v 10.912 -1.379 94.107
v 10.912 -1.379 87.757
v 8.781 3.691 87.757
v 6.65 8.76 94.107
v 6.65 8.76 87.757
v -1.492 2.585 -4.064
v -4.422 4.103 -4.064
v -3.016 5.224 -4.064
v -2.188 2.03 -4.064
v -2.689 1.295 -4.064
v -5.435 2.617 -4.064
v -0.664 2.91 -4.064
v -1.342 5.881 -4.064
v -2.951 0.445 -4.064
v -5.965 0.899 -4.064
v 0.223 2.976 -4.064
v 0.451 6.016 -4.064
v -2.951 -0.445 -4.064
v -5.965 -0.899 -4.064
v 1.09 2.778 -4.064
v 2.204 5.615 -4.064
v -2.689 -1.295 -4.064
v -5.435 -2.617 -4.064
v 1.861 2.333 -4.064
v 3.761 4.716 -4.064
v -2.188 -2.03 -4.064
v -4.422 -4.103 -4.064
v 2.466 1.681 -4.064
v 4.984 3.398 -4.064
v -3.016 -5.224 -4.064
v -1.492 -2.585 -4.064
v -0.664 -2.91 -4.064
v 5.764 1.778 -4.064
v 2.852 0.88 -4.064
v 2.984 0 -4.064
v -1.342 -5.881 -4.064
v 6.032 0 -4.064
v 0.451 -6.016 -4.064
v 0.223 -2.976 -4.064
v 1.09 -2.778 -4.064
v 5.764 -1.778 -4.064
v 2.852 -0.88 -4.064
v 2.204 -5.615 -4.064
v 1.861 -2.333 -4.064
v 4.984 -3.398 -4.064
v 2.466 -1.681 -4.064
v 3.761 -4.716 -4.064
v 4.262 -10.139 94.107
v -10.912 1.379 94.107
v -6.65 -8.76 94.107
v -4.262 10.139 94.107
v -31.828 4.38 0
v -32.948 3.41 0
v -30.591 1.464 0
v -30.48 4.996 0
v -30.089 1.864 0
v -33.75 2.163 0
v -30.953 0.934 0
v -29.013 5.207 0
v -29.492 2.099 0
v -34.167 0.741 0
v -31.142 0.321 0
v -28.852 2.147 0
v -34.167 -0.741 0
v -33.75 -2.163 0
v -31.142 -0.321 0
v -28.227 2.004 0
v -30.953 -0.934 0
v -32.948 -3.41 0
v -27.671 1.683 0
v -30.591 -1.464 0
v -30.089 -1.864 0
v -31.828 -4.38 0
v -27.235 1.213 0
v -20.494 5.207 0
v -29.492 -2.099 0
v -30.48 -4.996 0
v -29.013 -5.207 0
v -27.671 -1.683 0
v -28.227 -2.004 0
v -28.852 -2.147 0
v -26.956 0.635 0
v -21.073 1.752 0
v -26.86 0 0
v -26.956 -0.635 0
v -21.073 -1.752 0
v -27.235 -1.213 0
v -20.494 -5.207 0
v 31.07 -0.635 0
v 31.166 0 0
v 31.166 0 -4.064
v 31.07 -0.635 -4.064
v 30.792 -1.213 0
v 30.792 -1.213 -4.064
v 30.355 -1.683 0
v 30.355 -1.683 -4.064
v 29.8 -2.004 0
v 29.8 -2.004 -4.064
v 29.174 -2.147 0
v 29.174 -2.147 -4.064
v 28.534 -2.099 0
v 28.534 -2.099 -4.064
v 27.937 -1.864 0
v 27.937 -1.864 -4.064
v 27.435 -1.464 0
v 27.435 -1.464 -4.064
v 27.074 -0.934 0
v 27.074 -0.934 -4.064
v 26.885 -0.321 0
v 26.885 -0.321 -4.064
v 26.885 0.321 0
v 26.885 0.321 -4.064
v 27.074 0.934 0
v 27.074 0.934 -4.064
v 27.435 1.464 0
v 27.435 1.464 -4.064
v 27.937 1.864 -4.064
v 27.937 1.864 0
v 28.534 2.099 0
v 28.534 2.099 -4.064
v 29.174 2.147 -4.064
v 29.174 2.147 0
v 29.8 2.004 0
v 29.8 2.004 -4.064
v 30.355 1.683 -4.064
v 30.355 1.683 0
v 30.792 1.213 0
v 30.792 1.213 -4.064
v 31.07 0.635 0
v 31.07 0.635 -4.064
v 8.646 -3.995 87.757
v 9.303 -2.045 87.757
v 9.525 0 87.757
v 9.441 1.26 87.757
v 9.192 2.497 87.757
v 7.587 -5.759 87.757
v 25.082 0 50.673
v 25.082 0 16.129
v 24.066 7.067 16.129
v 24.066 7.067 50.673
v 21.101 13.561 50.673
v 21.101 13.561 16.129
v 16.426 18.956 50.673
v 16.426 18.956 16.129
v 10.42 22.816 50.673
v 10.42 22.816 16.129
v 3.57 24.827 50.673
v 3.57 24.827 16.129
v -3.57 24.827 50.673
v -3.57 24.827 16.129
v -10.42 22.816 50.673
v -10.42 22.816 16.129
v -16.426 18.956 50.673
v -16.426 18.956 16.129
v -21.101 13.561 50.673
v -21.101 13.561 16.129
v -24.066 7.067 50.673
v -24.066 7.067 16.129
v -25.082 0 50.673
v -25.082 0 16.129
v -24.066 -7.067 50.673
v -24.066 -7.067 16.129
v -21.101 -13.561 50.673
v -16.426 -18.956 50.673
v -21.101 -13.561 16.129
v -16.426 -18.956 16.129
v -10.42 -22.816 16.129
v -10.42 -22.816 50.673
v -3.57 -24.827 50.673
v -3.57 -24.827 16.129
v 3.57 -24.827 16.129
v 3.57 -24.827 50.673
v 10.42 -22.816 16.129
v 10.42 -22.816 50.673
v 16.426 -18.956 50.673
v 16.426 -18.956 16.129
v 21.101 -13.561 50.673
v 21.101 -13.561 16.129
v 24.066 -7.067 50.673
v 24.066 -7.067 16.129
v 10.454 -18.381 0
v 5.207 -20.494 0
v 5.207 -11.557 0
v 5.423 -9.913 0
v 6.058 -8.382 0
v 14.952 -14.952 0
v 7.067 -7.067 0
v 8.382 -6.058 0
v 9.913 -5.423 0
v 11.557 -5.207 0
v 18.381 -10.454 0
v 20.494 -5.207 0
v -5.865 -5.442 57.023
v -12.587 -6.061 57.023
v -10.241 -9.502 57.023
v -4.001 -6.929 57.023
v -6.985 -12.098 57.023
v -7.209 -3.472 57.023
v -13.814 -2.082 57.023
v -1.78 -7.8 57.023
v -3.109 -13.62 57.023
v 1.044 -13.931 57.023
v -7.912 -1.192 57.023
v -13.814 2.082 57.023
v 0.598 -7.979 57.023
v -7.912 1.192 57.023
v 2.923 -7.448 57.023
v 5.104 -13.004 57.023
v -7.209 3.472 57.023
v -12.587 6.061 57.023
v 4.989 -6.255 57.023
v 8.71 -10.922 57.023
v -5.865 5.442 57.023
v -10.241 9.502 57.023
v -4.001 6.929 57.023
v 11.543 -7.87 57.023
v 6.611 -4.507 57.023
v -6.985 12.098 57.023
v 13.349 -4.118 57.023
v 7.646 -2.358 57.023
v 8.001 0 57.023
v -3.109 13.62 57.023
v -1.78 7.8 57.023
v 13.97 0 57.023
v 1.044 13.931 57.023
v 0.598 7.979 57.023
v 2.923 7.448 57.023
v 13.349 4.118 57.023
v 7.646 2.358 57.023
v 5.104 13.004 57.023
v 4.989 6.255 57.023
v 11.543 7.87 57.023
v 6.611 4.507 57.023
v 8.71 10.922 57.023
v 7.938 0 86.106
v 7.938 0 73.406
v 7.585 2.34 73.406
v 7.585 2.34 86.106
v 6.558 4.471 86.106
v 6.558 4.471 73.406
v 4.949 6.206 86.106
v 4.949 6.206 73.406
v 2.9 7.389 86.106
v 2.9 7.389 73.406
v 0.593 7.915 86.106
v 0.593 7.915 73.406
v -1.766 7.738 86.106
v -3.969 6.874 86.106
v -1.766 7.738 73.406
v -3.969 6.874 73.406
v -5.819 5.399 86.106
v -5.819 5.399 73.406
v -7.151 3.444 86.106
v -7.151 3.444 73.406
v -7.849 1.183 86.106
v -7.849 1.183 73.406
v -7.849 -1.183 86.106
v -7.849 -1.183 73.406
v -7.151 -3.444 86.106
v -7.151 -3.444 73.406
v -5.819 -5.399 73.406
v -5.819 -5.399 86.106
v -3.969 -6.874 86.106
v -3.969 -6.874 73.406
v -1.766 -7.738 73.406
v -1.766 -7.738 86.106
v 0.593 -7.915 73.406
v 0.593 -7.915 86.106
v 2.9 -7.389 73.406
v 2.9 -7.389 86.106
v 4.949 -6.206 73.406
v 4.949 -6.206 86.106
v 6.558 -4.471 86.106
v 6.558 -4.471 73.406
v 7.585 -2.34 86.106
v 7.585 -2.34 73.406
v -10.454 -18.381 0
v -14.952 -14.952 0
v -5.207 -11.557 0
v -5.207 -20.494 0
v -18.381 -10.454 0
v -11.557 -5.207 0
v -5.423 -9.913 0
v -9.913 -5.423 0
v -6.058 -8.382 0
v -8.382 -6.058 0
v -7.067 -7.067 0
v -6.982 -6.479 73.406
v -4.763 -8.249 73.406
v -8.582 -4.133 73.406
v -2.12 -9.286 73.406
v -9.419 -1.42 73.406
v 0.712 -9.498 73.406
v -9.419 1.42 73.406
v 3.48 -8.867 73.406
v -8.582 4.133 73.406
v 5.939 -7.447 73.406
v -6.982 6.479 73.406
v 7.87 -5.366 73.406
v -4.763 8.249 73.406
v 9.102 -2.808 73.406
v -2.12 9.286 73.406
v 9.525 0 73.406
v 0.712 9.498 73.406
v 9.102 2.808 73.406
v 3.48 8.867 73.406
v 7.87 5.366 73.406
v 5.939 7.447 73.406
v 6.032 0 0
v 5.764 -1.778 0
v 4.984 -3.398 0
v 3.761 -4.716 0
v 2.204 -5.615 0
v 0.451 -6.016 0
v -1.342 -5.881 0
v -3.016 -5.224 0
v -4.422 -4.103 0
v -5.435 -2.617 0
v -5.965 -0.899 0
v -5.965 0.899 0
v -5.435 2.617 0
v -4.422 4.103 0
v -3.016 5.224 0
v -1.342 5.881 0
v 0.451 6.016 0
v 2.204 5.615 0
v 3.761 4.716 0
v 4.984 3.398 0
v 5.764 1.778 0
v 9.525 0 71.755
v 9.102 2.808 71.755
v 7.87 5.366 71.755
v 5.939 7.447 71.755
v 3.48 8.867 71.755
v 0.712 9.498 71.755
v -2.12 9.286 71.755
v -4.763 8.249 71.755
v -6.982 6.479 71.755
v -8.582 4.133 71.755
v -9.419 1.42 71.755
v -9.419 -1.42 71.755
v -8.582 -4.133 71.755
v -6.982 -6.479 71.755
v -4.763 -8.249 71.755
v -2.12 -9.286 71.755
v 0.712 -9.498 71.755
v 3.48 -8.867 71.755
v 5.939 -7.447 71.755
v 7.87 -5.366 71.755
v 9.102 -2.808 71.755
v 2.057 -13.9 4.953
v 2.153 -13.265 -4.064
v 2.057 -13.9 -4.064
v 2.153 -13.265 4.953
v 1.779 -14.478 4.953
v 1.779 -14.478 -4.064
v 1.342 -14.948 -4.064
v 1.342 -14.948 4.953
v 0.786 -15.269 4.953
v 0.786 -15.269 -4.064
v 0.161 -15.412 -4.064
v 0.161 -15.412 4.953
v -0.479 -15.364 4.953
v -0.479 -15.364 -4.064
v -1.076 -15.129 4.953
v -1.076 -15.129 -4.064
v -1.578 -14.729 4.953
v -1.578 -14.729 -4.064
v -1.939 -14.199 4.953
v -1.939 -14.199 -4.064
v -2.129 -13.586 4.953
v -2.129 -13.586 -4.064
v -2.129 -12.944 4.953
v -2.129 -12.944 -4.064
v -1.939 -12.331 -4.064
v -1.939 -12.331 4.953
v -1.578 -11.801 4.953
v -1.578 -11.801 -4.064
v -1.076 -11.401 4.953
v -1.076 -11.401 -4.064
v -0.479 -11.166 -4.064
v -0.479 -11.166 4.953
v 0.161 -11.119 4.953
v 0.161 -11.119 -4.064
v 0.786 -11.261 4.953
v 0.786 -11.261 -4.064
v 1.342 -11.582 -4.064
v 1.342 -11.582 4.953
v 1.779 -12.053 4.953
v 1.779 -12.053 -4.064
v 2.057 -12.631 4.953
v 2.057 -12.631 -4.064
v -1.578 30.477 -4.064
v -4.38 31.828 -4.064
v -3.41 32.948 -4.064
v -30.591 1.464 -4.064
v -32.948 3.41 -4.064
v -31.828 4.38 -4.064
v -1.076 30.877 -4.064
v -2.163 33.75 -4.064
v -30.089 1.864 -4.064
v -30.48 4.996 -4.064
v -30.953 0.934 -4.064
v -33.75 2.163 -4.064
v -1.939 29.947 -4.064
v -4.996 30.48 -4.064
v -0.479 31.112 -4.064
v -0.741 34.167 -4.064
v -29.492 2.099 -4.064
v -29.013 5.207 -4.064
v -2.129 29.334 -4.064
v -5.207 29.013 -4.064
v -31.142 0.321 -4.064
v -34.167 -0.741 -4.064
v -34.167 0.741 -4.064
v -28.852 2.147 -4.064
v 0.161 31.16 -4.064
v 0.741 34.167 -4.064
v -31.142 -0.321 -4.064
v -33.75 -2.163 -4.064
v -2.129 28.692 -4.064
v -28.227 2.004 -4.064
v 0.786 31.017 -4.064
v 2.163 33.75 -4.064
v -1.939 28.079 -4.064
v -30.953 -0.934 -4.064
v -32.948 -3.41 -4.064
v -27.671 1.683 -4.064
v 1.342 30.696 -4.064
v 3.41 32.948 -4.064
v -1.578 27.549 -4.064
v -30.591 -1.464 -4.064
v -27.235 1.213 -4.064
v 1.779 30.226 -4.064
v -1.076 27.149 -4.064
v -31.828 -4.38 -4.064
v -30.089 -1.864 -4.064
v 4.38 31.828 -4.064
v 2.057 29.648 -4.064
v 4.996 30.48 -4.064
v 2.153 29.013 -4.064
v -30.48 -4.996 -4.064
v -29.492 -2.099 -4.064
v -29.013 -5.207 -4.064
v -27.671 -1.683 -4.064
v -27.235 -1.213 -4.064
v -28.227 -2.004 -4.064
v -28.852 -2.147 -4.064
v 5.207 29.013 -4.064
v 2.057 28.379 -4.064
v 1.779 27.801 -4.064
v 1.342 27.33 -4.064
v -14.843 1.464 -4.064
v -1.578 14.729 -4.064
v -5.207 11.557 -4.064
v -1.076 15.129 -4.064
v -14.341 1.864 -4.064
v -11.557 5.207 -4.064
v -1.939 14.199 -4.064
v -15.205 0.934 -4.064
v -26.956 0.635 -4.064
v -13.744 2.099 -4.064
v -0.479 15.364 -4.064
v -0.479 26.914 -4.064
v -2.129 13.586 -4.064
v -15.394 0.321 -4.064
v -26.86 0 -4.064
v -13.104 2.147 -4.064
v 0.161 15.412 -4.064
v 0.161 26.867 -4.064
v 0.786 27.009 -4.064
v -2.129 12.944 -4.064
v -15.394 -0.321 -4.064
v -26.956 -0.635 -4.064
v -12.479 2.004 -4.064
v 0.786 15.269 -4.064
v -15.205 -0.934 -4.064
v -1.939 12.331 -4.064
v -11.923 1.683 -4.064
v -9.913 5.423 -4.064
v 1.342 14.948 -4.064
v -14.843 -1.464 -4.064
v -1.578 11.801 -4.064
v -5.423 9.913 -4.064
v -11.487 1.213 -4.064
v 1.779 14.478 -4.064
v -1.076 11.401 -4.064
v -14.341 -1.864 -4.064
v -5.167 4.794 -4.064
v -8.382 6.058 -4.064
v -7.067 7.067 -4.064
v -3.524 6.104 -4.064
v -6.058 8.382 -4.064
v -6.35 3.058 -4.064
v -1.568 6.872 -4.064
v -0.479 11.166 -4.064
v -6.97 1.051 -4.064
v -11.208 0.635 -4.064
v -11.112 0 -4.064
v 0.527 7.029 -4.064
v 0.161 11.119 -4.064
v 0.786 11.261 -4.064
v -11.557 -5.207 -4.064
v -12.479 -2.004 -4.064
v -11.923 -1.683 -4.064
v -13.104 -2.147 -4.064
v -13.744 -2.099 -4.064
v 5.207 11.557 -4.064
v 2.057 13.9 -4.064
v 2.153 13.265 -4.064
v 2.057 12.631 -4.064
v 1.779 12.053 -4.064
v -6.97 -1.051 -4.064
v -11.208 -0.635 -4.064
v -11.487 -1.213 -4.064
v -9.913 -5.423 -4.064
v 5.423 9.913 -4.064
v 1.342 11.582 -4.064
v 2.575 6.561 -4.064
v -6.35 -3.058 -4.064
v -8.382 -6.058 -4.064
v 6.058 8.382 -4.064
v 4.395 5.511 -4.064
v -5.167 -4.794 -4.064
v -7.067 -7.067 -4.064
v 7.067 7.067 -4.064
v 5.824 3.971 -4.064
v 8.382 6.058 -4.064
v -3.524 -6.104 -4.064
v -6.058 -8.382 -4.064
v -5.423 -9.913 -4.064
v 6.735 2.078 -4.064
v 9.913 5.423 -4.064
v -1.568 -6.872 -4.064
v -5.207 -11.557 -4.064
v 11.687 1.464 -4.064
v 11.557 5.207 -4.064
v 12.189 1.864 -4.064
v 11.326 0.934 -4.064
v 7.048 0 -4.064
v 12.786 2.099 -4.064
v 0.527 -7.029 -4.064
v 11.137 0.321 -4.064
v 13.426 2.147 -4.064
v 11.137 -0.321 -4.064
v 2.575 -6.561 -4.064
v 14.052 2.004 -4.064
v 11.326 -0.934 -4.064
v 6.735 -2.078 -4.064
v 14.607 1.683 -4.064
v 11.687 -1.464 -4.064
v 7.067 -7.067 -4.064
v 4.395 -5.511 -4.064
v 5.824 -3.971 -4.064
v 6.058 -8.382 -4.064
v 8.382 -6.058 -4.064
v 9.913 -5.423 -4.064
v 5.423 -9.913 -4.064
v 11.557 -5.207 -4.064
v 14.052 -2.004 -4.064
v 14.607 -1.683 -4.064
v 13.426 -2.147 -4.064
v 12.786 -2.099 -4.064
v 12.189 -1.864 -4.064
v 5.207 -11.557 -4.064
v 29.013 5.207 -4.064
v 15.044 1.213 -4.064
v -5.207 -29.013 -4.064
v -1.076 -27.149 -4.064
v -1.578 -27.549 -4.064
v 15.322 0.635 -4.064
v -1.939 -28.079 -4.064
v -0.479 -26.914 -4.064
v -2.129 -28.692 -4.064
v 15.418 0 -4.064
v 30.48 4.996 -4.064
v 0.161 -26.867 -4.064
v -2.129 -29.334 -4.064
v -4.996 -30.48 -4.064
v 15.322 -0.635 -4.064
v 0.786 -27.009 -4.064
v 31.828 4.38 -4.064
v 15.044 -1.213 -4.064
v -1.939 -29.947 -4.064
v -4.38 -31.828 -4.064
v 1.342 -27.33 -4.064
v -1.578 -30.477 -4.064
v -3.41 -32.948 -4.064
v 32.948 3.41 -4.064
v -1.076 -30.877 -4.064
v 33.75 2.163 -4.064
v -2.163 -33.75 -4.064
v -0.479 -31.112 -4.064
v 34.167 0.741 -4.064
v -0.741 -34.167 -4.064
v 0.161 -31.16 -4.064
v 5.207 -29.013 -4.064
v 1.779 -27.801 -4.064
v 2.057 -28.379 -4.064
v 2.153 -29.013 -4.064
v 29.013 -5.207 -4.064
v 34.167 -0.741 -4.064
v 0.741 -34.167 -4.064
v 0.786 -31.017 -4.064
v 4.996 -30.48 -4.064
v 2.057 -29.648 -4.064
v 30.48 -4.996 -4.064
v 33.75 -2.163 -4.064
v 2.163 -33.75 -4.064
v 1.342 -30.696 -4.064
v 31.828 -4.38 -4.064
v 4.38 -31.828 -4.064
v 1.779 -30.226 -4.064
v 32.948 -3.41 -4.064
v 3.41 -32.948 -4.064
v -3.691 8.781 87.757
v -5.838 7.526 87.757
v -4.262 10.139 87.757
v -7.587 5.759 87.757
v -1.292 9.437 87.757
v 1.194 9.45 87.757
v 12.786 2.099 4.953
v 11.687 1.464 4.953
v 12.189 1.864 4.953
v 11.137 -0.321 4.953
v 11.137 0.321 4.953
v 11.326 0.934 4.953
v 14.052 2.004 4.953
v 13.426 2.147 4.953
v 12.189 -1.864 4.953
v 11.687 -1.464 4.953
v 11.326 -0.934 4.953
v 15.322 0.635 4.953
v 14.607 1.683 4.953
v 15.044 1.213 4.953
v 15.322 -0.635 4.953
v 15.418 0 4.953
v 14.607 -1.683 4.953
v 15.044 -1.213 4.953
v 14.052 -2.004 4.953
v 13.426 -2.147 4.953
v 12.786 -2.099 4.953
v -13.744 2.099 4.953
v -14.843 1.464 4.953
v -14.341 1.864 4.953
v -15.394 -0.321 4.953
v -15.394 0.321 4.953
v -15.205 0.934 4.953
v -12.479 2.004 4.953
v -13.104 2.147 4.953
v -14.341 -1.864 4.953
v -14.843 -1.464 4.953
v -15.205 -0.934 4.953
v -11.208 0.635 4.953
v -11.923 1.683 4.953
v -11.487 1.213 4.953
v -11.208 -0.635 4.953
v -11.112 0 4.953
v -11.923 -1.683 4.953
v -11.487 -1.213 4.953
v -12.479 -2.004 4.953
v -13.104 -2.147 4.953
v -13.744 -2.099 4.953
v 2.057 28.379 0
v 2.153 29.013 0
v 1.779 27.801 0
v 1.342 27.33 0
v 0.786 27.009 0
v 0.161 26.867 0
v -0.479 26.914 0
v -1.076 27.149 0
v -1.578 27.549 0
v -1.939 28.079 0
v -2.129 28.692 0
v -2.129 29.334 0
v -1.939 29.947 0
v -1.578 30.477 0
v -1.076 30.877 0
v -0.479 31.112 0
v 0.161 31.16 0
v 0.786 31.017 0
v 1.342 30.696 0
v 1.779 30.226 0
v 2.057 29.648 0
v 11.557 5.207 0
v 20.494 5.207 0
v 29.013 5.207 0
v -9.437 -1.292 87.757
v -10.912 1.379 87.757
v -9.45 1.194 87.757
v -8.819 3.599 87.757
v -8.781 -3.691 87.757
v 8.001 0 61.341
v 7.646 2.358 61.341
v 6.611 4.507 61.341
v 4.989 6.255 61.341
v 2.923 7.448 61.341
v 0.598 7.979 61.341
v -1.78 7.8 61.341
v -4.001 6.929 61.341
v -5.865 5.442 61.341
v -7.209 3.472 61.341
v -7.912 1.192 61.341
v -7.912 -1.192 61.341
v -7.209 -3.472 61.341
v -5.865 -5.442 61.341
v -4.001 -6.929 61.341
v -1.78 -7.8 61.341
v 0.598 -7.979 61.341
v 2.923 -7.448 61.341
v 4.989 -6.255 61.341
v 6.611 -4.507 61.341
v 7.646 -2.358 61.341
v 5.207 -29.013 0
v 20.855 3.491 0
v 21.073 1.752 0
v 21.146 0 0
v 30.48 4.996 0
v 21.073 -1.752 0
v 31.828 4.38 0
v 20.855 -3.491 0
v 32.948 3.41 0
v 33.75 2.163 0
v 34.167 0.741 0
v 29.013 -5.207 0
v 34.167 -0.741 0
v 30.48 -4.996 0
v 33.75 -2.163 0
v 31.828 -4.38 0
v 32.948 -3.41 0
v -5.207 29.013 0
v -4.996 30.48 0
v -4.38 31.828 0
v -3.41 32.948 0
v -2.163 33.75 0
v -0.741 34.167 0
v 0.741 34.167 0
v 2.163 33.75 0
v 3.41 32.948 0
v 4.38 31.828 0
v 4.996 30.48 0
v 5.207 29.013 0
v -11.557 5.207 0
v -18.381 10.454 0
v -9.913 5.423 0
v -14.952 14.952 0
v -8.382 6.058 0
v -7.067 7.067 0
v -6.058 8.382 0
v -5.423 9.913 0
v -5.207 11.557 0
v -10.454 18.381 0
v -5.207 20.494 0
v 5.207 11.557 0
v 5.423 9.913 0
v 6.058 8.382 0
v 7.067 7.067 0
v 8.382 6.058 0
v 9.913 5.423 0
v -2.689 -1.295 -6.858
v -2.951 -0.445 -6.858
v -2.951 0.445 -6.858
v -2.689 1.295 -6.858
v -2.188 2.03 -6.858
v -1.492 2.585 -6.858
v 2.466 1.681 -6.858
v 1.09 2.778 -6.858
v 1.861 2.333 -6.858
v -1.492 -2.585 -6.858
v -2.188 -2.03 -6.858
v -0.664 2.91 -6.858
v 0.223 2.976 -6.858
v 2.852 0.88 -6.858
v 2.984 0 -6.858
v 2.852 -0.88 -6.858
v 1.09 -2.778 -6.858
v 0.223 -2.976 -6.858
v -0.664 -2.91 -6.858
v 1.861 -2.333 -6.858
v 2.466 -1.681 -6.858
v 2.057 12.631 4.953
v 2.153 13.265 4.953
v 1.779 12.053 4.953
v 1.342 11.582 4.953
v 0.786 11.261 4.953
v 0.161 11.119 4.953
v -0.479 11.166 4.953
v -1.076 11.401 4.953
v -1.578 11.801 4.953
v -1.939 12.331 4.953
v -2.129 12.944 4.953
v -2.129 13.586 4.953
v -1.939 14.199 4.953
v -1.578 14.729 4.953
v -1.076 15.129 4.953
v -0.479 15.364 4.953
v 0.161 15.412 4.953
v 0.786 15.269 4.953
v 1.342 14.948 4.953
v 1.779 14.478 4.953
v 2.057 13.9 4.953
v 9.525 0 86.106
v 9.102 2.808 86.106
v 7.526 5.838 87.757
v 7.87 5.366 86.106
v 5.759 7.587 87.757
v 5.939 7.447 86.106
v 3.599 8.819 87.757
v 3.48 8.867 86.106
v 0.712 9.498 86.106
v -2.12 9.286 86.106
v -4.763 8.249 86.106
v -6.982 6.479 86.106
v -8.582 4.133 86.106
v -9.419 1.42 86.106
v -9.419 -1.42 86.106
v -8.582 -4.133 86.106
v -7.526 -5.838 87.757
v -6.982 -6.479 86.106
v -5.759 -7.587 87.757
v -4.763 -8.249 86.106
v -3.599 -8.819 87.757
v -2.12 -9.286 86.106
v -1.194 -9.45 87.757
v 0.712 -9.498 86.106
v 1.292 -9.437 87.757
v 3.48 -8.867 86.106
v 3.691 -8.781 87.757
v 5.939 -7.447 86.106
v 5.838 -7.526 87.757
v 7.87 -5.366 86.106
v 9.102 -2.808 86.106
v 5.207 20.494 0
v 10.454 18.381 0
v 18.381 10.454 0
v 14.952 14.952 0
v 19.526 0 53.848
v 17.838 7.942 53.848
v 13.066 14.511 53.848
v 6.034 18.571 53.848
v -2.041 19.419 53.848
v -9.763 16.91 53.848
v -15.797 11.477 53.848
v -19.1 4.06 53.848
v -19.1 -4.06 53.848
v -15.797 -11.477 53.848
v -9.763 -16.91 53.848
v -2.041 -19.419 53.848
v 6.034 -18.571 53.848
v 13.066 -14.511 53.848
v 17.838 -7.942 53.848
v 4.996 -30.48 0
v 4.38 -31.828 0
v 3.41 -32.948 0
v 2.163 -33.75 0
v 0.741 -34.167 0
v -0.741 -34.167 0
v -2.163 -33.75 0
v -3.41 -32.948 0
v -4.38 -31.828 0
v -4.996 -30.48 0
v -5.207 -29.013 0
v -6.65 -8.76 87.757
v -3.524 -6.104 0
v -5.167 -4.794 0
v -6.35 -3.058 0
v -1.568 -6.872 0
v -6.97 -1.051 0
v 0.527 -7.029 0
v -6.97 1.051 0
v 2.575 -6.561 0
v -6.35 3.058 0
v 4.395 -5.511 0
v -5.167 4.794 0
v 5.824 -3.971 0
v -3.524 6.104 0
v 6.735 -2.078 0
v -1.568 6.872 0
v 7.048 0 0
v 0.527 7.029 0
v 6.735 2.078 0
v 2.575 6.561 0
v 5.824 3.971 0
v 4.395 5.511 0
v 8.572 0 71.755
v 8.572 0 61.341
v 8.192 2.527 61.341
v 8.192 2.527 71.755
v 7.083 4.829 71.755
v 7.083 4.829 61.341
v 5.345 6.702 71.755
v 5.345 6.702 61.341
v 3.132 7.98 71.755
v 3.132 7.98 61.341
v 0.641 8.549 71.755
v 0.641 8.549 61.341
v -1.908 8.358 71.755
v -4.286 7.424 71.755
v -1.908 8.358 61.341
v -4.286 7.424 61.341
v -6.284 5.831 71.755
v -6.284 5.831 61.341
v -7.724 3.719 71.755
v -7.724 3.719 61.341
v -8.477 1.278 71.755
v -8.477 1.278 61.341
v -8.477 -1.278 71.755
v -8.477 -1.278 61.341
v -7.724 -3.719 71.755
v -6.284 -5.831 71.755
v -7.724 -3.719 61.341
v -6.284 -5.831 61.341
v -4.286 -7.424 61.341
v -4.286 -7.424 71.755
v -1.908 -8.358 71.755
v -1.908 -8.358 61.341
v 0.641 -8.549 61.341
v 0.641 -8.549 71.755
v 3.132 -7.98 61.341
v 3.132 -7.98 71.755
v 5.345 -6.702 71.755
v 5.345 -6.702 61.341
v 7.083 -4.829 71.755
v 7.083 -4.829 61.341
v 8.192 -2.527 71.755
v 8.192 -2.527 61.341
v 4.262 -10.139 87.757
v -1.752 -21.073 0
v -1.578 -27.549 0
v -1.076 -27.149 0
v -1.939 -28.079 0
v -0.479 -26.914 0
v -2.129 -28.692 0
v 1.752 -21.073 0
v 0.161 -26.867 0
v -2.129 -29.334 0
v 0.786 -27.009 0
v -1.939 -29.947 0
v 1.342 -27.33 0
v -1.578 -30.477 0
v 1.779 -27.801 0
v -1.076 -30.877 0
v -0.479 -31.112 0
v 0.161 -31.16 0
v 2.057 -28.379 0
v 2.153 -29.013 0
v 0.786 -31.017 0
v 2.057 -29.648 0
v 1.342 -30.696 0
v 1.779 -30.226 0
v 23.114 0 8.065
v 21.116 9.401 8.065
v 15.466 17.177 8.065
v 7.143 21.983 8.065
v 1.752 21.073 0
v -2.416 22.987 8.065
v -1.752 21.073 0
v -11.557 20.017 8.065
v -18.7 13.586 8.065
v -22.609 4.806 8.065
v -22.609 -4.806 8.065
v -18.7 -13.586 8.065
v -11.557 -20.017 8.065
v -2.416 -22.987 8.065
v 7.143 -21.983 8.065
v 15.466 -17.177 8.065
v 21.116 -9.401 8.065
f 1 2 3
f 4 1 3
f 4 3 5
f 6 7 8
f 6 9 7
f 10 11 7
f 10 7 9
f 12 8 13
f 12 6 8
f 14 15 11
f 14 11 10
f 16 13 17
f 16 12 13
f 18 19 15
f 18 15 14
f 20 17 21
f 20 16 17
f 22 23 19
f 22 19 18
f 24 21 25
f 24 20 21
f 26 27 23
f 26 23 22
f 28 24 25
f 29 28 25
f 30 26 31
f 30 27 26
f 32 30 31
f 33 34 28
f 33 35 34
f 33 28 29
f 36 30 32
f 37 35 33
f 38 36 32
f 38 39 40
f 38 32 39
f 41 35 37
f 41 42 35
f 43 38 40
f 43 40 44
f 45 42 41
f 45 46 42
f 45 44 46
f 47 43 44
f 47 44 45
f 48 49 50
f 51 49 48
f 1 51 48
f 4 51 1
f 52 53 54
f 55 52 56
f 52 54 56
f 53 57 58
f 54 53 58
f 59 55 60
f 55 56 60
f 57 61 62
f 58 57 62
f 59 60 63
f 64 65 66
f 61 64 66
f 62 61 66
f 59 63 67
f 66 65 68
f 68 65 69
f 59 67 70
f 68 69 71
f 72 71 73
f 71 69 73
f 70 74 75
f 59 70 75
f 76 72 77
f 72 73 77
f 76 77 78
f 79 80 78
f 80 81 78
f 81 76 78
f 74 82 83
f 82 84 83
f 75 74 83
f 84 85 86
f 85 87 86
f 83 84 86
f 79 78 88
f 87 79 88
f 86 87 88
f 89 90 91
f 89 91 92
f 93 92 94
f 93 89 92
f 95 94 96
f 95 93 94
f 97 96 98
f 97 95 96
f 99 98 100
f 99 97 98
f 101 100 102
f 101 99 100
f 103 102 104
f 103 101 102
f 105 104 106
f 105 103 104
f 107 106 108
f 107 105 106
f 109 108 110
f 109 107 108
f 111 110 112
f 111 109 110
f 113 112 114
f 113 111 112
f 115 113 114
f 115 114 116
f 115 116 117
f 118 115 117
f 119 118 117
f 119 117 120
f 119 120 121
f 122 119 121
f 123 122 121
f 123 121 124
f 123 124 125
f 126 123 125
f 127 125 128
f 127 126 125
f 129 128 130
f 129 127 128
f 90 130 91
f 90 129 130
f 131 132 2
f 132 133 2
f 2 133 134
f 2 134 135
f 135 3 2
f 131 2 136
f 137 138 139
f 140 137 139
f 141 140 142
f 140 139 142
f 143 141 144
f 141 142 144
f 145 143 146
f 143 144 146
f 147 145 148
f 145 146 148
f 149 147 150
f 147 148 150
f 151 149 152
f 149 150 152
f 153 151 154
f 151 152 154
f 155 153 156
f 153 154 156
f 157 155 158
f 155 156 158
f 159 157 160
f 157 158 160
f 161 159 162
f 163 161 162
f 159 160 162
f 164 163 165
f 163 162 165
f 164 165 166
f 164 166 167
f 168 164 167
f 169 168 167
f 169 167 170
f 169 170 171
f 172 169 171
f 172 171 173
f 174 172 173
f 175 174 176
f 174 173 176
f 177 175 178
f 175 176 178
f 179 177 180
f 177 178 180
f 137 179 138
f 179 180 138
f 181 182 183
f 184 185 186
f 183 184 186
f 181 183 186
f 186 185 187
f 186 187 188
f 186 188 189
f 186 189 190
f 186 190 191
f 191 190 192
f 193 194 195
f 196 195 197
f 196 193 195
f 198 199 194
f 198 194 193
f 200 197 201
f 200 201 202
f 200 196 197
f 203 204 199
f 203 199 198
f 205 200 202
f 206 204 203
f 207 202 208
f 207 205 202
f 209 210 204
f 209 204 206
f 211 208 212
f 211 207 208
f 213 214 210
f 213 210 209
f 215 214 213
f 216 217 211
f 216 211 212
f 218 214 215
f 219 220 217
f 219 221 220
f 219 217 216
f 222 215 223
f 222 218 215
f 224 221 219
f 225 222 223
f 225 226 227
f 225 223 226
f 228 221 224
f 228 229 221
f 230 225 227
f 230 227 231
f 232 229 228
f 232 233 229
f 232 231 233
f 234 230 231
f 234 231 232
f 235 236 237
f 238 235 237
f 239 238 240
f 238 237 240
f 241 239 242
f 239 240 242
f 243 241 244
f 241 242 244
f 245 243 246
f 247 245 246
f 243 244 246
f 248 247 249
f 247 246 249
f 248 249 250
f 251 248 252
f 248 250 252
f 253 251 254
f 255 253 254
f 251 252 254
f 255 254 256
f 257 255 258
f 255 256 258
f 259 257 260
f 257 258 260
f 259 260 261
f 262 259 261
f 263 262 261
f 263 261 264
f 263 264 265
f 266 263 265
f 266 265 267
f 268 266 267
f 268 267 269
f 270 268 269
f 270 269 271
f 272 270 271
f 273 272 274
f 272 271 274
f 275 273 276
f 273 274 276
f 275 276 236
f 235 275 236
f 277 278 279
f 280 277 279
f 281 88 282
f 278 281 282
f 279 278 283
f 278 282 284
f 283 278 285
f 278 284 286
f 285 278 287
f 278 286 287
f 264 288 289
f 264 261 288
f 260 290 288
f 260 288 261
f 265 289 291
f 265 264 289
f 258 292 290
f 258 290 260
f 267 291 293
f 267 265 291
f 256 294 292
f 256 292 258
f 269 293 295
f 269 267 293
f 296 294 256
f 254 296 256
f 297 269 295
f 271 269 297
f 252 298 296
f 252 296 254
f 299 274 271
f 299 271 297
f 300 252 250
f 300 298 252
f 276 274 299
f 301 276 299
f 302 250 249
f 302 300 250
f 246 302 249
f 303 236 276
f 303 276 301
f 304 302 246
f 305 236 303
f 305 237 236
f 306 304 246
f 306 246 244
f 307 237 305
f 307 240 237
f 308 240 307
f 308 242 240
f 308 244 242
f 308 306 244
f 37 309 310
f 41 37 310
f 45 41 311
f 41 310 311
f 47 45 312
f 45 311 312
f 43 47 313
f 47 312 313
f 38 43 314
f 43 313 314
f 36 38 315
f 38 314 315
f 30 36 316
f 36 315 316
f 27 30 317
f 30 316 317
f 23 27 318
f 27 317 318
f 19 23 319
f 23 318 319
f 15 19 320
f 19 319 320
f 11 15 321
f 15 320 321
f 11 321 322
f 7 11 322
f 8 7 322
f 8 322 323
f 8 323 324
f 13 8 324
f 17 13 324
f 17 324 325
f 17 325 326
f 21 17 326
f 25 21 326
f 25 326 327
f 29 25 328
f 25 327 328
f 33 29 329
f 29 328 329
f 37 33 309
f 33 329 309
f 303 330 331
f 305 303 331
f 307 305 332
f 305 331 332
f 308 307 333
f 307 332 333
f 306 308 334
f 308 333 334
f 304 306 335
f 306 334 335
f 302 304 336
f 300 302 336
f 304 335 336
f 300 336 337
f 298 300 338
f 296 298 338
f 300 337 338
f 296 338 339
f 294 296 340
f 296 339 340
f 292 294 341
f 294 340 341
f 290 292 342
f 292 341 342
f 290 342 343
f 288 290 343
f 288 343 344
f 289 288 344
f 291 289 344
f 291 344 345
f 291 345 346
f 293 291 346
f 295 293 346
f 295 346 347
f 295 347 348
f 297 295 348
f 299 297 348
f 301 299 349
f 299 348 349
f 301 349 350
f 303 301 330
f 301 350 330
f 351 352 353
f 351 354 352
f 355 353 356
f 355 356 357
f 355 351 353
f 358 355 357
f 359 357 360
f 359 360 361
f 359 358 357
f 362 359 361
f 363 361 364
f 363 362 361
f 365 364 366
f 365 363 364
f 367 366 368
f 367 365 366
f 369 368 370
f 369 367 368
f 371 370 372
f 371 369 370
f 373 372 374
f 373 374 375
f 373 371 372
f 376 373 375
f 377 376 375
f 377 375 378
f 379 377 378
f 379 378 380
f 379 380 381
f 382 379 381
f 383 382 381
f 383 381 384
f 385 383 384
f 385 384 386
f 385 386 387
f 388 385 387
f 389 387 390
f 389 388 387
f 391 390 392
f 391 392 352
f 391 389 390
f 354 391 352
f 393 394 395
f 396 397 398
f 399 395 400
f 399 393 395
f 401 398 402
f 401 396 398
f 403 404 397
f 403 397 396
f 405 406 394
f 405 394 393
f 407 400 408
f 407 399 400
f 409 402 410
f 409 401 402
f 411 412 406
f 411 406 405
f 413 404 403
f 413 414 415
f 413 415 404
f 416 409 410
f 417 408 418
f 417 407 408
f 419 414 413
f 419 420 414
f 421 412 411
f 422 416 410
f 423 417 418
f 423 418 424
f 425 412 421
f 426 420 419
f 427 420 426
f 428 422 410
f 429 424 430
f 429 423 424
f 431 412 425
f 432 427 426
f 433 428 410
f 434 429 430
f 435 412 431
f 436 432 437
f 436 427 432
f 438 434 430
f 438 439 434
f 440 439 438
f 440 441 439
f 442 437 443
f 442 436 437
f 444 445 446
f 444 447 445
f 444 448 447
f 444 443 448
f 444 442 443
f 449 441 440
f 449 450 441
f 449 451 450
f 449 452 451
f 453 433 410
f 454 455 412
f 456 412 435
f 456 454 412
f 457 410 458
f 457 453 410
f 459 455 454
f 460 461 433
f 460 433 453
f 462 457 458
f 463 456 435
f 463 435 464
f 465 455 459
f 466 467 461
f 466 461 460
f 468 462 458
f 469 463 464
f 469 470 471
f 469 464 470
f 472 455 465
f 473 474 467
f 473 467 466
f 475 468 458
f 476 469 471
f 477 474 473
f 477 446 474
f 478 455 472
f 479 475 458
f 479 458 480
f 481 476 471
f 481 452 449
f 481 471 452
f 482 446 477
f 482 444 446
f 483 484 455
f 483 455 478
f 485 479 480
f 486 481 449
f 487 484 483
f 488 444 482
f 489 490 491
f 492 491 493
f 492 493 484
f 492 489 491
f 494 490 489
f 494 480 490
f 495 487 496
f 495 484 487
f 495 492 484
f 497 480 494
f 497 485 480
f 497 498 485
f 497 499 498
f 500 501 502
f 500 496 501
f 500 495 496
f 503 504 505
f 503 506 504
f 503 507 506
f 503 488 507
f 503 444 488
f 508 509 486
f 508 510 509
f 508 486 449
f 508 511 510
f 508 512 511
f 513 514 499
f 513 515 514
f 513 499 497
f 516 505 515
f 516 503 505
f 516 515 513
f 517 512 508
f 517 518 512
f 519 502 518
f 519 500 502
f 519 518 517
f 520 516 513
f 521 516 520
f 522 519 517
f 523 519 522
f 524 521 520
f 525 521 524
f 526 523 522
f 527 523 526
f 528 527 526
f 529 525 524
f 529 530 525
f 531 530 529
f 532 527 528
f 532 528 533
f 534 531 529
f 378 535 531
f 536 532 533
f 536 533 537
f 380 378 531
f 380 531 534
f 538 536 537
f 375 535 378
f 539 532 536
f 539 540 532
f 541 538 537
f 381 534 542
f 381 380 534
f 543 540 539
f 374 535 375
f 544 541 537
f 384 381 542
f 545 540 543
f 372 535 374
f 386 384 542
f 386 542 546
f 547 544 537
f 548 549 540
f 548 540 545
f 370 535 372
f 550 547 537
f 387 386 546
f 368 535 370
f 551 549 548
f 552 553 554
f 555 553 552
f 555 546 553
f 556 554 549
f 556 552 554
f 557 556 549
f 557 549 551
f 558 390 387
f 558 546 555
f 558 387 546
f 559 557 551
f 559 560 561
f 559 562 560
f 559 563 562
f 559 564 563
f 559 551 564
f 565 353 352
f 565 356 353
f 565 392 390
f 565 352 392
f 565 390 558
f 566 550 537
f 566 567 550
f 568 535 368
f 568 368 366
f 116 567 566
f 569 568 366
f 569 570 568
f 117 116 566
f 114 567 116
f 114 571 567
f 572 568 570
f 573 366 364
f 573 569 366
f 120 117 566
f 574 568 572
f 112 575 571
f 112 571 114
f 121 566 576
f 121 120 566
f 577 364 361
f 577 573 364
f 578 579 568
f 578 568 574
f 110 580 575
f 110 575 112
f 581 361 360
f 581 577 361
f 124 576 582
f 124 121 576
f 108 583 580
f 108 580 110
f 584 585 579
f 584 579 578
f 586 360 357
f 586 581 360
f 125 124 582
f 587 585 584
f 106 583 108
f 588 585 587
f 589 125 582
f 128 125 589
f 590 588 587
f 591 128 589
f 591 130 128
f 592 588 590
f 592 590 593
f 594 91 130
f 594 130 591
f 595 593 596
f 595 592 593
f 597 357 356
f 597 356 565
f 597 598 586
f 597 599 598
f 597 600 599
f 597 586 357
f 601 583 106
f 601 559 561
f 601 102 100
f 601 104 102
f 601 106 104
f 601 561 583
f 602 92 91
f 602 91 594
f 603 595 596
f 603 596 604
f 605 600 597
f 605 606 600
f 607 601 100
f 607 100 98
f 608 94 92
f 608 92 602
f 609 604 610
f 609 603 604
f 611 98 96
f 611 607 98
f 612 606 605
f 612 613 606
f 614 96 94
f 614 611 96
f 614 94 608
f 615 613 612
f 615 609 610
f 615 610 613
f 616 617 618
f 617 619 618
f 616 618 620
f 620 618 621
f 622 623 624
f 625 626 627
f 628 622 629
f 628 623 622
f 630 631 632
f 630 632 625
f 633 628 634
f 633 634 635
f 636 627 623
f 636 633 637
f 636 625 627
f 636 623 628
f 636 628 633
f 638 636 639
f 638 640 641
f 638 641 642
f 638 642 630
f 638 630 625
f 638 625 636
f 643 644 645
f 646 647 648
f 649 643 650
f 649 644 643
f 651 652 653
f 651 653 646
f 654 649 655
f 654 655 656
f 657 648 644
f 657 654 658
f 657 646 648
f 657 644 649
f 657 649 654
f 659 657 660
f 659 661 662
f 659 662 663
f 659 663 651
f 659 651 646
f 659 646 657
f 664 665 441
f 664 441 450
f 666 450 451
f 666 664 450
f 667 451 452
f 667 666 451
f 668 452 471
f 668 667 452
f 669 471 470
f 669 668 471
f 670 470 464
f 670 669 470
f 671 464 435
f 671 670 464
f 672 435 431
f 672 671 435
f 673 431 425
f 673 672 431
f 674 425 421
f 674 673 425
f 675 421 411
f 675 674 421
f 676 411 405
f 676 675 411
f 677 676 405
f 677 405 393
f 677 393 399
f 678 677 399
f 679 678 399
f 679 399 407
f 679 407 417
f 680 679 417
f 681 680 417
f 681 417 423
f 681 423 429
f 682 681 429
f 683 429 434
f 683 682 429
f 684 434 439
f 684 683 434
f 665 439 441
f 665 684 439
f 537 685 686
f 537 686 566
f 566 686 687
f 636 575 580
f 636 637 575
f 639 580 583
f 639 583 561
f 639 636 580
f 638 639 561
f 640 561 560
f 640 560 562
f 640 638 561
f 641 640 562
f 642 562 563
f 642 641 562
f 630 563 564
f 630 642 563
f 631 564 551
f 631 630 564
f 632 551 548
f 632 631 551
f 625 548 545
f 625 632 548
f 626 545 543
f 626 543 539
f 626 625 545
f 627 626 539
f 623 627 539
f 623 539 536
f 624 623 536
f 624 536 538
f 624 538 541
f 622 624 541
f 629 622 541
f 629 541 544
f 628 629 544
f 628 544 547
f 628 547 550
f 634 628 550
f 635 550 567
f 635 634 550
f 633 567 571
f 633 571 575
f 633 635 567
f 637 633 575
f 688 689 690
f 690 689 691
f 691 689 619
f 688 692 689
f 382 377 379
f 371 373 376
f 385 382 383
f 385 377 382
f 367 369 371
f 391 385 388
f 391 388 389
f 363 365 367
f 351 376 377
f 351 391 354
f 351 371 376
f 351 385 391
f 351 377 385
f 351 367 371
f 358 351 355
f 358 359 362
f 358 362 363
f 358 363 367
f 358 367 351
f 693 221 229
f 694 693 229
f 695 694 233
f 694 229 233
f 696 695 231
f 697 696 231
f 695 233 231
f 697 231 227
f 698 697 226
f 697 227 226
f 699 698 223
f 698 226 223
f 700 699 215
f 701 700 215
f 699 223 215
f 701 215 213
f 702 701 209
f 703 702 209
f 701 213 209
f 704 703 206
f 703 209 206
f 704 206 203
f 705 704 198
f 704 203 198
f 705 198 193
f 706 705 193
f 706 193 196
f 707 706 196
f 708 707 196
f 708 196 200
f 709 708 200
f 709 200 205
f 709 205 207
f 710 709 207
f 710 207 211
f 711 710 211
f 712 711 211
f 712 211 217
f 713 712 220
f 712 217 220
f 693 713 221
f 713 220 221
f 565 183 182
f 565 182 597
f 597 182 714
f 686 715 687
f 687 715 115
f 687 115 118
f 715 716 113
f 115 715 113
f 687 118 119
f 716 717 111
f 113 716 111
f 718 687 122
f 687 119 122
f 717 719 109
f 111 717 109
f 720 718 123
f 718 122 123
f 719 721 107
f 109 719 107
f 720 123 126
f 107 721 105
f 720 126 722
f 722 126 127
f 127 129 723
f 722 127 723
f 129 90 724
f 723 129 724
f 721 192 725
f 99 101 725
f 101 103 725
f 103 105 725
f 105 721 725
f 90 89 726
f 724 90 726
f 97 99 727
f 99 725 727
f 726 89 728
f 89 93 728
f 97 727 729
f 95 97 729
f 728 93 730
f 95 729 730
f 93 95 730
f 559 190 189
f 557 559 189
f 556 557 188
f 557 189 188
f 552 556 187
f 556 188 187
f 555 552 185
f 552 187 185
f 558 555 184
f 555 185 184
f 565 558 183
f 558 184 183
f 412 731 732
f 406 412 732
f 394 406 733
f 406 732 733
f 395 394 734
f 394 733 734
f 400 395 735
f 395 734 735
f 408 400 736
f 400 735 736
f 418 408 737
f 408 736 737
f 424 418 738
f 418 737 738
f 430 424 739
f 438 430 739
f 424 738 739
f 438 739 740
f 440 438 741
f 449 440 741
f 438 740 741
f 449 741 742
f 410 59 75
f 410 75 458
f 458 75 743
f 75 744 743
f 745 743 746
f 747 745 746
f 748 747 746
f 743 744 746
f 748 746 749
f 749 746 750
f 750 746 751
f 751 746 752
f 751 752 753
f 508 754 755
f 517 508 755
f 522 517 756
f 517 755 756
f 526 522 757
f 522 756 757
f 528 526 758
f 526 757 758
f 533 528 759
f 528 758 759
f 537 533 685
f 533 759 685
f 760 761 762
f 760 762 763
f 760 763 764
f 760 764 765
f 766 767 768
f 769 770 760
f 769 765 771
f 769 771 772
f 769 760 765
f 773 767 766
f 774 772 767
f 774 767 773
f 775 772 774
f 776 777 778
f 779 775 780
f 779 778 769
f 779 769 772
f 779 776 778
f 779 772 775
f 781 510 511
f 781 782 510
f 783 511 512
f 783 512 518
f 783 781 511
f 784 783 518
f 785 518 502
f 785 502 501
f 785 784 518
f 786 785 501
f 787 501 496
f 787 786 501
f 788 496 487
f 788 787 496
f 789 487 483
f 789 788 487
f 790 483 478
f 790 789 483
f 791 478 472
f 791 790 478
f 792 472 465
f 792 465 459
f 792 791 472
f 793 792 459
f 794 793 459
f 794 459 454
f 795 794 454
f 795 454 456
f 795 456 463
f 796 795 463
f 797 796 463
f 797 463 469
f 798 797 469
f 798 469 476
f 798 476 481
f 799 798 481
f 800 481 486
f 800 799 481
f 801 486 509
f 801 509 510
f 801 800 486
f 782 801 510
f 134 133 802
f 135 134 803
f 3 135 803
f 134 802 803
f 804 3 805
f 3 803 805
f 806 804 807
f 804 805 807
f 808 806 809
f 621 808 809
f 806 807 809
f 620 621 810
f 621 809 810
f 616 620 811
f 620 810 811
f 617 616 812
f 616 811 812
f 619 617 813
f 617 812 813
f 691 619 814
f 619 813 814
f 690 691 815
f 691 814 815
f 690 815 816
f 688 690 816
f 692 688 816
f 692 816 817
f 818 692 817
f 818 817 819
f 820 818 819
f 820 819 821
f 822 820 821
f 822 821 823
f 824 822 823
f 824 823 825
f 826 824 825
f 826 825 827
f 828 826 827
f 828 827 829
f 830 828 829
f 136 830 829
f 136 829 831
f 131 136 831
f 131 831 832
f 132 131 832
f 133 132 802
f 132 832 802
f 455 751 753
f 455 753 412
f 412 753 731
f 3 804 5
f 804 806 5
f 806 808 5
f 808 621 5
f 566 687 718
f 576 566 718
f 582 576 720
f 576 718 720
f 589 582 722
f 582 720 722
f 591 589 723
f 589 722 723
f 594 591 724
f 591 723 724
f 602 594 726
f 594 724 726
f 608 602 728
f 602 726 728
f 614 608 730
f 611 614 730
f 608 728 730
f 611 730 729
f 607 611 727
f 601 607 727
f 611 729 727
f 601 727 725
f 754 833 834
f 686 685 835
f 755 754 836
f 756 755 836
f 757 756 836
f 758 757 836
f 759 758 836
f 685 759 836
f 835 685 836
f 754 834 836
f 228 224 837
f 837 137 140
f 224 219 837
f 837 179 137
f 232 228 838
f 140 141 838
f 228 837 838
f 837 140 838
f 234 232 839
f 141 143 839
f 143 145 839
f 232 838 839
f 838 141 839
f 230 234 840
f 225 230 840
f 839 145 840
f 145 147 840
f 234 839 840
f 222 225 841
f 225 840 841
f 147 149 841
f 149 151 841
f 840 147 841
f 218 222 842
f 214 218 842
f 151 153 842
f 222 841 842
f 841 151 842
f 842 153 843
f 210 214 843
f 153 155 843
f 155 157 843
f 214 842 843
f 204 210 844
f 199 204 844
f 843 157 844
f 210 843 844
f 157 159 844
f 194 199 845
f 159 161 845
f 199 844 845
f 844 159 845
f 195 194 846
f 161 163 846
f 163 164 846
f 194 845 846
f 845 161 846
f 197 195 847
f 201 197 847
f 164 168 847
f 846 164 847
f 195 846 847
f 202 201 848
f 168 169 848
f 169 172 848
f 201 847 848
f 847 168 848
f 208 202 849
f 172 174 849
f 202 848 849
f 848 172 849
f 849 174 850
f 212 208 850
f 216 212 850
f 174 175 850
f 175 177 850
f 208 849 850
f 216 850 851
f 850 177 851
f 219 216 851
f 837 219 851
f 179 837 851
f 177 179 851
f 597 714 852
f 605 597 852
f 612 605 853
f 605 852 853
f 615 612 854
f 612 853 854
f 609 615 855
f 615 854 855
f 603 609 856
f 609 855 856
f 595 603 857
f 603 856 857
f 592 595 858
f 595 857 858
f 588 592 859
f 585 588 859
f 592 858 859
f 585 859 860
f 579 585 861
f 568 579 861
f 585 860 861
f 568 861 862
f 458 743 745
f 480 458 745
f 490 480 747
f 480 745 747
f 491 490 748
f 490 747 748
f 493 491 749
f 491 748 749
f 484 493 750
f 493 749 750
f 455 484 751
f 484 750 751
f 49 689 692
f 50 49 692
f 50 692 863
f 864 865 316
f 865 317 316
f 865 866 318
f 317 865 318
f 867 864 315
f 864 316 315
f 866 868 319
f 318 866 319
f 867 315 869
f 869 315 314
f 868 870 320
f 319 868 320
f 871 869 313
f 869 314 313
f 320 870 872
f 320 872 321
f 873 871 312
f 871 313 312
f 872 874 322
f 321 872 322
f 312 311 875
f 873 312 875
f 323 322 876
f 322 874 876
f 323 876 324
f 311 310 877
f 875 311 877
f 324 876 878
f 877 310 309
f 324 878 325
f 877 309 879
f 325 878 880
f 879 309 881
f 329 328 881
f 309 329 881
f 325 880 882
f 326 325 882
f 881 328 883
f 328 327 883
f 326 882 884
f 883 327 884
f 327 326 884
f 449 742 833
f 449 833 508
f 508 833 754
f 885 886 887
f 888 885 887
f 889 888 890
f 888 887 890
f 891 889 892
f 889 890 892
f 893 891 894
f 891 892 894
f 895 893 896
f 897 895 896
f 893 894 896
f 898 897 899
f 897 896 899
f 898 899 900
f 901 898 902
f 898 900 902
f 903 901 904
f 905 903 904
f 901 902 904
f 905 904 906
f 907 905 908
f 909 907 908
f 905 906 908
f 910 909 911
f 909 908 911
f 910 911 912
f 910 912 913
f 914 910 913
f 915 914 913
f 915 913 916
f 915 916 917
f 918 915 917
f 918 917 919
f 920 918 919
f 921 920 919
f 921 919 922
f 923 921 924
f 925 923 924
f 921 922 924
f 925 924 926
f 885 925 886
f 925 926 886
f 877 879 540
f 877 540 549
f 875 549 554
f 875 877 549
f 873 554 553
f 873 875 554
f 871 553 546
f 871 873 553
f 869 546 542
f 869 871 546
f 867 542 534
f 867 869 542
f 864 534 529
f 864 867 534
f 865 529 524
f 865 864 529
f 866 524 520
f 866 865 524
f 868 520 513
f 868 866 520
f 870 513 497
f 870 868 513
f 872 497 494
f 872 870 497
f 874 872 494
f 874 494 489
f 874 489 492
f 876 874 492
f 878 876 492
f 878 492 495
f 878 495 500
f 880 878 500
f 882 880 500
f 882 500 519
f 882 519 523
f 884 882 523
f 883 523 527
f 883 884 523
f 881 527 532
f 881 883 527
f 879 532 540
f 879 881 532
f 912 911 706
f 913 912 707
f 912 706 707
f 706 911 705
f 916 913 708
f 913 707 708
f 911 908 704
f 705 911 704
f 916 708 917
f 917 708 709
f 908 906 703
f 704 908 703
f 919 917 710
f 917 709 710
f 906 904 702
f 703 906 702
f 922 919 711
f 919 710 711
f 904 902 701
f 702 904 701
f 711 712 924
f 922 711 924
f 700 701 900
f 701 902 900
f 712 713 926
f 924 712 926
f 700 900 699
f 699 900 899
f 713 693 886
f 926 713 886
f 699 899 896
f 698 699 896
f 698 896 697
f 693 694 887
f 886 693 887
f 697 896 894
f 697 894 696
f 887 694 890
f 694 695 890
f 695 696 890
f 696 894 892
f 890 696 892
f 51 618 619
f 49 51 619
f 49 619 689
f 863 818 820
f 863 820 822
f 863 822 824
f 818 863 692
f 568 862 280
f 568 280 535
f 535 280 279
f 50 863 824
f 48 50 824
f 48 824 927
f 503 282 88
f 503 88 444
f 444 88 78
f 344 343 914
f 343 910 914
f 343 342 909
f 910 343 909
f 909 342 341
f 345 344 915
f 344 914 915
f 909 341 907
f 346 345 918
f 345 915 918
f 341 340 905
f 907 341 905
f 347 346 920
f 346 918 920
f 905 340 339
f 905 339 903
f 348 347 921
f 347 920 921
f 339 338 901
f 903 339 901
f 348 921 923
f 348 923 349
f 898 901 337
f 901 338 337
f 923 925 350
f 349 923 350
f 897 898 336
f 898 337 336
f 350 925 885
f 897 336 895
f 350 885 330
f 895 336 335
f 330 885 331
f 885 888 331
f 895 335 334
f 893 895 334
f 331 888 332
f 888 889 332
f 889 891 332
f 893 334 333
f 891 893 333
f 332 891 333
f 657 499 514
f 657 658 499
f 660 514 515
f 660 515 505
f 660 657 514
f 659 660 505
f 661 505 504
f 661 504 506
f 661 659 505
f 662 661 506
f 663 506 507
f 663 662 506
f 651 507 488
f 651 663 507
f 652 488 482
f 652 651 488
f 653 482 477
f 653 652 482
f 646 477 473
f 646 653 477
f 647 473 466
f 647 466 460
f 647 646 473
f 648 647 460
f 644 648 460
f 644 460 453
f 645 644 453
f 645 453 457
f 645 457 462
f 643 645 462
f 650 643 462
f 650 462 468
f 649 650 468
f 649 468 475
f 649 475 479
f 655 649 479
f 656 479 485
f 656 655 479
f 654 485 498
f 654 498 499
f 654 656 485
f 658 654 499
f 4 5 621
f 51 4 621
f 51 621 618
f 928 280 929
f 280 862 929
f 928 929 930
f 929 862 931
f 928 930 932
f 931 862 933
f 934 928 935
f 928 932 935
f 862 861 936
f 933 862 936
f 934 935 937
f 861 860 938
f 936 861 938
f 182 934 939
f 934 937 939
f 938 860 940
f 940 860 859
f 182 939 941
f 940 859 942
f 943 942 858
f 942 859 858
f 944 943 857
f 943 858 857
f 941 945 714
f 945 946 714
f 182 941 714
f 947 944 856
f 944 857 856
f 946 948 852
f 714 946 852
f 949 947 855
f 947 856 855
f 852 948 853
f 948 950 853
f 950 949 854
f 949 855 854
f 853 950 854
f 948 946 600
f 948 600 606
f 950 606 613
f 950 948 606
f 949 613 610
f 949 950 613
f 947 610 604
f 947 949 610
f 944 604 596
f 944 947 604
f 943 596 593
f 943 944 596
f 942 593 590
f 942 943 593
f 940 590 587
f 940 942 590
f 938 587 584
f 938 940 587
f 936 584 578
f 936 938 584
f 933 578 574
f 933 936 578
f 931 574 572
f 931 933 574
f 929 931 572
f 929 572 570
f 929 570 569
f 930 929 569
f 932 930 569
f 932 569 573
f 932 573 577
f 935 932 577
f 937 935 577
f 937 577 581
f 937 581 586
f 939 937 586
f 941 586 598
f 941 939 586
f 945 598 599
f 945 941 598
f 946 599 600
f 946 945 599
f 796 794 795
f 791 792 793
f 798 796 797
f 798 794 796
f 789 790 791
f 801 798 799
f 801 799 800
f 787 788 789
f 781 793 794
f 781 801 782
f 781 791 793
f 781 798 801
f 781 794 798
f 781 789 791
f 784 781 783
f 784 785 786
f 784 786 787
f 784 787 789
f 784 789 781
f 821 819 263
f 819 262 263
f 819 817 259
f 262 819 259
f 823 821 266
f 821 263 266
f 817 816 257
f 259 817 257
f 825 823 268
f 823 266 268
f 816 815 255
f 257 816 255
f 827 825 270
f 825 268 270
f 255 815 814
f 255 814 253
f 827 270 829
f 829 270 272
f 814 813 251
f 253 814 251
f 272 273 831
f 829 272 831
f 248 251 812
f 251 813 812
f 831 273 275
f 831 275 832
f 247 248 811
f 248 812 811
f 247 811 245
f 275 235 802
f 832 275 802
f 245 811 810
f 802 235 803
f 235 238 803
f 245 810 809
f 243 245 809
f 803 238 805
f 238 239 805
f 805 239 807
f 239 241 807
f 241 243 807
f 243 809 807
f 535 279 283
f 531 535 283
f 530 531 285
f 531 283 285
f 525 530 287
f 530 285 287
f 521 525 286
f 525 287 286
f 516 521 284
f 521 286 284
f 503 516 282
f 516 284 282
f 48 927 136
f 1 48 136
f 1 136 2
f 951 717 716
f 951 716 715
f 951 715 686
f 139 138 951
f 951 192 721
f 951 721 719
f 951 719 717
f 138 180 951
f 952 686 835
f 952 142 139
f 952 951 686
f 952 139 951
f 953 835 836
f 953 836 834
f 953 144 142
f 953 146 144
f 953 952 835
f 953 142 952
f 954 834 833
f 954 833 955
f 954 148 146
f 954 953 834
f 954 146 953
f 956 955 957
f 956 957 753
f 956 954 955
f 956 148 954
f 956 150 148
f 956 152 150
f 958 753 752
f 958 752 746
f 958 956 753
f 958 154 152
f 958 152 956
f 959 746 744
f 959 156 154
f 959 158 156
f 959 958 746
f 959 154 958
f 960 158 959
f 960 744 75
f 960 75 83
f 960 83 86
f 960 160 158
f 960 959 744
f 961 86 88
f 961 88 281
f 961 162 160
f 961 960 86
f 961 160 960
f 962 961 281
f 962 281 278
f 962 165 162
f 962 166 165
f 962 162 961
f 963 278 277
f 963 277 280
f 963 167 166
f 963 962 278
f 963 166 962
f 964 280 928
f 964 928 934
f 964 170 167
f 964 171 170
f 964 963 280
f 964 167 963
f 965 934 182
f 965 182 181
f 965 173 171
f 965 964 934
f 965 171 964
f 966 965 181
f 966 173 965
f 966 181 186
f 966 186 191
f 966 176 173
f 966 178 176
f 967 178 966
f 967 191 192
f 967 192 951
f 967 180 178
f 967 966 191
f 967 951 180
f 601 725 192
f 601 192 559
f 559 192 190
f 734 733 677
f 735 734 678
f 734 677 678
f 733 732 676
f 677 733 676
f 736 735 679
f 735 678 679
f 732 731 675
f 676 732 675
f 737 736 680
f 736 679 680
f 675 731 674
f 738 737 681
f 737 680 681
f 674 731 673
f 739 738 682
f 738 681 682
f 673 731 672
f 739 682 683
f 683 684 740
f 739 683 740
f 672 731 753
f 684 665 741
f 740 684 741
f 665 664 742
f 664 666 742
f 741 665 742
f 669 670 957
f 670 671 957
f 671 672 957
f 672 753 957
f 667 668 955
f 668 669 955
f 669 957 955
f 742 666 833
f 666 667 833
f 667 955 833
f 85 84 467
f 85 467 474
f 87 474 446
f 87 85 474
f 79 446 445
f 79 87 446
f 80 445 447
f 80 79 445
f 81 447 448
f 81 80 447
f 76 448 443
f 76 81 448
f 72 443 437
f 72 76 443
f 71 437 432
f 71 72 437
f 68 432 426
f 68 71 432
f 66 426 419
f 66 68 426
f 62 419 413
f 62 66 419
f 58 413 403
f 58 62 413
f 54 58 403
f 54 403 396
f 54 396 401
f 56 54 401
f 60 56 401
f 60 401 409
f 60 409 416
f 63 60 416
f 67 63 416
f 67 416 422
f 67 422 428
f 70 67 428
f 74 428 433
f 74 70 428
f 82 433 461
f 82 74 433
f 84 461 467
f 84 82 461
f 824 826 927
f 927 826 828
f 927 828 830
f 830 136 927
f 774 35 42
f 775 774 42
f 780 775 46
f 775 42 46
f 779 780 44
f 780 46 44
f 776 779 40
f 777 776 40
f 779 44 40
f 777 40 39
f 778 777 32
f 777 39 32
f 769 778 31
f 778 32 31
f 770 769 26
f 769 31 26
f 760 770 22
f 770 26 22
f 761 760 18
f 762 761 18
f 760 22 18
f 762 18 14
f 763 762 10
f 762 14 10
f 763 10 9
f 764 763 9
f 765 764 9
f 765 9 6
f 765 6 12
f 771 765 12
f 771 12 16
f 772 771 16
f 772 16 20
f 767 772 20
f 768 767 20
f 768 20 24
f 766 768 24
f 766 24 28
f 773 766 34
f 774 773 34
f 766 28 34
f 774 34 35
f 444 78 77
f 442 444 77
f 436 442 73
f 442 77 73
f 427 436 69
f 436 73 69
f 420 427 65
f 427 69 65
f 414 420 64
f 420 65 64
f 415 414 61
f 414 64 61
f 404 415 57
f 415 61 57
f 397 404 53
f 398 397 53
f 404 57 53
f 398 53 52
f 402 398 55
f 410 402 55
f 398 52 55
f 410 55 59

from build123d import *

# Parameters (mm, degrees)
F0_R      = 21.1455
F2_R      = 25.0825
F4_DEPTH  = 34.544
F6_R      = 13.97
F4_FACE_R = 25.0825
F8_R      = 8.001
F9_DEPTH  = 4.318
F10_R     = 3.00355
F11_DEPTH = 15.24
F12_R     = 6.0325
F13_DEPTH = 4.064
F14_R     = 2.9845
F15_DEPTH = 2.794
F16_R     = 2.15265
F17_DEPTH = 4.953
F18_R     = 2.15265
F18_R_2   = 7.0485
F19_DEPTH = 4.064
F20_R     = 8.5725
F21_DEPTH = 10.414
F22_R     = 9.525
F23_DEPTH = 1.651
F24_R     = 7.9375
F25_DEPTH = 12.7
F26_R     = 9.525
F27_DEPTH = 1.651
F29_DEPTH = 6.35


# Not quite as in the source:
# - a feature names something its author has since deleted; it is built from what else it names


with BuildPart() as f3:
    # F0 (on Top) → F3 section 0
    with BuildSketch(Plane.XY):
        Circle(F0_R)
    # F2 (on offset) → F3 section 1
    with BuildSketch(Plane.XY.offset(16.129)):
        Circle(F2_R)
    loft()

    # F4 (add): a face of the model
    f4_faces = [f3.faces().sort_by_distance(p)[0] for p in [
        (0, 0, 16.129),
    ]]
    extrude(f4_faces, amount=F4_DEPTH)

    # F6 (on offset) → F7 section 0
    with BuildSketch(Plane.XY.offset(57.023)):
        Circle(F6_R)
    # F4_face (on face) → F7 section 1
    with BuildSketch(Plane.XY.offset(50.673)):
        Circle(F4_FACE_R)
    loft()

    # F8 (on face) → F9 (join)
    with BuildSketch(Plane.XY.offset(57.023)):
        Circle(F8_R)
    extrude(amount=F9_DEPTH)

    # F10 (on face) → F11 (join)
    with BuildSketch(Plane.XY.offset(61.341)):
        Circle(F10_R)
    extrude(amount=F11_DEPTH)

    # F12 (on face) → F13 (join)
    with BuildSketch(Plane(origin=(0, 0, 0), x_dir=(1, 0, 0), z_dir=(0, 0, -1))):
        Circle(F12_R)
    extrude(amount=F13_DEPTH)

    # F14 (on face) → F15 (join)
    with BuildSketch(Plane(origin=(0, 0, -4.064), x_dir=(1, 0, 0), z_dir=(0, 0, -1))):
        Circle(F14_R)
    extrude(amount=F15_DEPTH)

    # F16 (on face) → F17 (cut)
    with BuildSketch(Plane(origin=(0, 0, 0), x_dir=(1, 0, 0), z_dir=(0, 0, -1))):
        with Locations((0, 13.26515)):
            Circle(F16_R)
        with Locations((13.26515, 0)):
            Circle(F16_R)
        with Locations((0, -13.26515)):
            Circle(F16_R)
        with Locations((-13.26515, 0)):
            Circle(F16_R)
    extrude(amount=-F17_DEPTH, mode=Mode.SUBTRACT)

    # F18 (on face) → F19 (join)
    with BuildSketch(Plane(origin=(0, 0, 0), x_dir=(1, 0, 0), z_dir=(0, 0, -1))):
        with BuildLine():
            ThreePointArc((11.557, 5.207), (7.0668719395, 7.0668719395), (5.207, 11.557))
            Line((5.207, 11.557), (5.207, 29.01315))
            ThreePointArc((5.207, 29.01315), (0, 34.22015), (-5.207, 29.01315))
            Line((-5.207, 29.01315), (-5.207, 11.557))
            ThreePointArc((-5.207, 11.557), (-7.0668719395, 7.0668719395), (-11.557, 5.207))
            Line((-11.557, 5.207), (-29.01315, 5.207))
            ThreePointArc((-29.01315, 5.207), (-34.22015, 0), (-29.01315, -5.207))
            Line((-29.01315, -5.207), (-11.557, -5.207))
            ThreePointArc((-11.557, -5.207), (-7.0668719395, -7.0668719395), (-5.207, -11.557))
            Line((-5.207, -11.557), (-5.207, -29.01315))
            ThreePointArc((-5.207, -29.01315), (0, -34.22015), (5.207, -29.01315))
            Line((5.207, -29.01315), (5.207, -11.557))
            ThreePointArc((5.207, -11.557), (7.0668719395, -7.0668719395), (11.557, -5.207))
            Line((11.557, -5.207), (29.01315, -5.207))
            ThreePointArc((29.01315, -5.207), (34.22015, 0), (29.01315, 5.207))
            Line((29.01315, 5.207), (11.557, 5.207))
        make_face()
        with Locations((0, -29.01315)):
            Circle(F18_R, mode=Mode.SUBTRACT)
        with Locations((0, -13.26515)):
            Circle(F18_R, mode=Mode.SUBTRACT)
        with Locations((-29.01315, 0)):
            Circle(F18_R, mode=Mode.SUBTRACT)
        with Locations((-13.26515, 0)):
            Circle(F18_R, mode=Mode.SUBTRACT)
        Circle(F18_R_2, mode=Mode.SUBTRACT)
        with Locations((13.26515, 0)):
            Circle(F18_R, mode=Mode.SUBTRACT)
        with Locations((0, 13.26515)):
            Circle(F18_R, mode=Mode.SUBTRACT)
        with Locations((29.01315, 0)):
            Circle(F18_R, mode=Mode.SUBTRACT)
        with Locations((0, 29.01315)):
            Circle(F18_R, mode=Mode.SUBTRACT)
    extrude(amount=F19_DEPTH)

    # F20 (on face) → F21 (join)
    with BuildSketch(Plane.XY.offset(61.341)):
        Circle(F20_R)
    extrude(amount=F21_DEPTH)

    # F22 (on face) → F23 (join)
    with BuildSketch(Plane.XY.offset(71.755)):
        Circle(F22_R)
    extrude(amount=F23_DEPTH)

    # F24 (on face) → F25 (join)
    with BuildSketch(Plane.XY.offset(73.406)):
        Circle(F24_R)
    extrude(amount=F25_DEPTH)

    # F26 (on face) → F27 (join)
    with BuildSketch(Plane.XY.offset(86.106)):
        Circle(F26_R)
    extrude(amount=F27_DEPTH)

    # F28 (on face) → F29 (join)
    with BuildSketch(Plane.XY.offset(87.757)):
        Polygon((6.6499638915, 8.760449774), (-4.2617901071, 10.1392625512), (-10.9117539986, 1.3788127773), (-6.6499638915, -8.760449774), (4.2617901071, -10.1392625512), (10.9117539986, -1.3788127773), align=None)
    extrude(amount=F29_DEPTH)


solid = f3.part
